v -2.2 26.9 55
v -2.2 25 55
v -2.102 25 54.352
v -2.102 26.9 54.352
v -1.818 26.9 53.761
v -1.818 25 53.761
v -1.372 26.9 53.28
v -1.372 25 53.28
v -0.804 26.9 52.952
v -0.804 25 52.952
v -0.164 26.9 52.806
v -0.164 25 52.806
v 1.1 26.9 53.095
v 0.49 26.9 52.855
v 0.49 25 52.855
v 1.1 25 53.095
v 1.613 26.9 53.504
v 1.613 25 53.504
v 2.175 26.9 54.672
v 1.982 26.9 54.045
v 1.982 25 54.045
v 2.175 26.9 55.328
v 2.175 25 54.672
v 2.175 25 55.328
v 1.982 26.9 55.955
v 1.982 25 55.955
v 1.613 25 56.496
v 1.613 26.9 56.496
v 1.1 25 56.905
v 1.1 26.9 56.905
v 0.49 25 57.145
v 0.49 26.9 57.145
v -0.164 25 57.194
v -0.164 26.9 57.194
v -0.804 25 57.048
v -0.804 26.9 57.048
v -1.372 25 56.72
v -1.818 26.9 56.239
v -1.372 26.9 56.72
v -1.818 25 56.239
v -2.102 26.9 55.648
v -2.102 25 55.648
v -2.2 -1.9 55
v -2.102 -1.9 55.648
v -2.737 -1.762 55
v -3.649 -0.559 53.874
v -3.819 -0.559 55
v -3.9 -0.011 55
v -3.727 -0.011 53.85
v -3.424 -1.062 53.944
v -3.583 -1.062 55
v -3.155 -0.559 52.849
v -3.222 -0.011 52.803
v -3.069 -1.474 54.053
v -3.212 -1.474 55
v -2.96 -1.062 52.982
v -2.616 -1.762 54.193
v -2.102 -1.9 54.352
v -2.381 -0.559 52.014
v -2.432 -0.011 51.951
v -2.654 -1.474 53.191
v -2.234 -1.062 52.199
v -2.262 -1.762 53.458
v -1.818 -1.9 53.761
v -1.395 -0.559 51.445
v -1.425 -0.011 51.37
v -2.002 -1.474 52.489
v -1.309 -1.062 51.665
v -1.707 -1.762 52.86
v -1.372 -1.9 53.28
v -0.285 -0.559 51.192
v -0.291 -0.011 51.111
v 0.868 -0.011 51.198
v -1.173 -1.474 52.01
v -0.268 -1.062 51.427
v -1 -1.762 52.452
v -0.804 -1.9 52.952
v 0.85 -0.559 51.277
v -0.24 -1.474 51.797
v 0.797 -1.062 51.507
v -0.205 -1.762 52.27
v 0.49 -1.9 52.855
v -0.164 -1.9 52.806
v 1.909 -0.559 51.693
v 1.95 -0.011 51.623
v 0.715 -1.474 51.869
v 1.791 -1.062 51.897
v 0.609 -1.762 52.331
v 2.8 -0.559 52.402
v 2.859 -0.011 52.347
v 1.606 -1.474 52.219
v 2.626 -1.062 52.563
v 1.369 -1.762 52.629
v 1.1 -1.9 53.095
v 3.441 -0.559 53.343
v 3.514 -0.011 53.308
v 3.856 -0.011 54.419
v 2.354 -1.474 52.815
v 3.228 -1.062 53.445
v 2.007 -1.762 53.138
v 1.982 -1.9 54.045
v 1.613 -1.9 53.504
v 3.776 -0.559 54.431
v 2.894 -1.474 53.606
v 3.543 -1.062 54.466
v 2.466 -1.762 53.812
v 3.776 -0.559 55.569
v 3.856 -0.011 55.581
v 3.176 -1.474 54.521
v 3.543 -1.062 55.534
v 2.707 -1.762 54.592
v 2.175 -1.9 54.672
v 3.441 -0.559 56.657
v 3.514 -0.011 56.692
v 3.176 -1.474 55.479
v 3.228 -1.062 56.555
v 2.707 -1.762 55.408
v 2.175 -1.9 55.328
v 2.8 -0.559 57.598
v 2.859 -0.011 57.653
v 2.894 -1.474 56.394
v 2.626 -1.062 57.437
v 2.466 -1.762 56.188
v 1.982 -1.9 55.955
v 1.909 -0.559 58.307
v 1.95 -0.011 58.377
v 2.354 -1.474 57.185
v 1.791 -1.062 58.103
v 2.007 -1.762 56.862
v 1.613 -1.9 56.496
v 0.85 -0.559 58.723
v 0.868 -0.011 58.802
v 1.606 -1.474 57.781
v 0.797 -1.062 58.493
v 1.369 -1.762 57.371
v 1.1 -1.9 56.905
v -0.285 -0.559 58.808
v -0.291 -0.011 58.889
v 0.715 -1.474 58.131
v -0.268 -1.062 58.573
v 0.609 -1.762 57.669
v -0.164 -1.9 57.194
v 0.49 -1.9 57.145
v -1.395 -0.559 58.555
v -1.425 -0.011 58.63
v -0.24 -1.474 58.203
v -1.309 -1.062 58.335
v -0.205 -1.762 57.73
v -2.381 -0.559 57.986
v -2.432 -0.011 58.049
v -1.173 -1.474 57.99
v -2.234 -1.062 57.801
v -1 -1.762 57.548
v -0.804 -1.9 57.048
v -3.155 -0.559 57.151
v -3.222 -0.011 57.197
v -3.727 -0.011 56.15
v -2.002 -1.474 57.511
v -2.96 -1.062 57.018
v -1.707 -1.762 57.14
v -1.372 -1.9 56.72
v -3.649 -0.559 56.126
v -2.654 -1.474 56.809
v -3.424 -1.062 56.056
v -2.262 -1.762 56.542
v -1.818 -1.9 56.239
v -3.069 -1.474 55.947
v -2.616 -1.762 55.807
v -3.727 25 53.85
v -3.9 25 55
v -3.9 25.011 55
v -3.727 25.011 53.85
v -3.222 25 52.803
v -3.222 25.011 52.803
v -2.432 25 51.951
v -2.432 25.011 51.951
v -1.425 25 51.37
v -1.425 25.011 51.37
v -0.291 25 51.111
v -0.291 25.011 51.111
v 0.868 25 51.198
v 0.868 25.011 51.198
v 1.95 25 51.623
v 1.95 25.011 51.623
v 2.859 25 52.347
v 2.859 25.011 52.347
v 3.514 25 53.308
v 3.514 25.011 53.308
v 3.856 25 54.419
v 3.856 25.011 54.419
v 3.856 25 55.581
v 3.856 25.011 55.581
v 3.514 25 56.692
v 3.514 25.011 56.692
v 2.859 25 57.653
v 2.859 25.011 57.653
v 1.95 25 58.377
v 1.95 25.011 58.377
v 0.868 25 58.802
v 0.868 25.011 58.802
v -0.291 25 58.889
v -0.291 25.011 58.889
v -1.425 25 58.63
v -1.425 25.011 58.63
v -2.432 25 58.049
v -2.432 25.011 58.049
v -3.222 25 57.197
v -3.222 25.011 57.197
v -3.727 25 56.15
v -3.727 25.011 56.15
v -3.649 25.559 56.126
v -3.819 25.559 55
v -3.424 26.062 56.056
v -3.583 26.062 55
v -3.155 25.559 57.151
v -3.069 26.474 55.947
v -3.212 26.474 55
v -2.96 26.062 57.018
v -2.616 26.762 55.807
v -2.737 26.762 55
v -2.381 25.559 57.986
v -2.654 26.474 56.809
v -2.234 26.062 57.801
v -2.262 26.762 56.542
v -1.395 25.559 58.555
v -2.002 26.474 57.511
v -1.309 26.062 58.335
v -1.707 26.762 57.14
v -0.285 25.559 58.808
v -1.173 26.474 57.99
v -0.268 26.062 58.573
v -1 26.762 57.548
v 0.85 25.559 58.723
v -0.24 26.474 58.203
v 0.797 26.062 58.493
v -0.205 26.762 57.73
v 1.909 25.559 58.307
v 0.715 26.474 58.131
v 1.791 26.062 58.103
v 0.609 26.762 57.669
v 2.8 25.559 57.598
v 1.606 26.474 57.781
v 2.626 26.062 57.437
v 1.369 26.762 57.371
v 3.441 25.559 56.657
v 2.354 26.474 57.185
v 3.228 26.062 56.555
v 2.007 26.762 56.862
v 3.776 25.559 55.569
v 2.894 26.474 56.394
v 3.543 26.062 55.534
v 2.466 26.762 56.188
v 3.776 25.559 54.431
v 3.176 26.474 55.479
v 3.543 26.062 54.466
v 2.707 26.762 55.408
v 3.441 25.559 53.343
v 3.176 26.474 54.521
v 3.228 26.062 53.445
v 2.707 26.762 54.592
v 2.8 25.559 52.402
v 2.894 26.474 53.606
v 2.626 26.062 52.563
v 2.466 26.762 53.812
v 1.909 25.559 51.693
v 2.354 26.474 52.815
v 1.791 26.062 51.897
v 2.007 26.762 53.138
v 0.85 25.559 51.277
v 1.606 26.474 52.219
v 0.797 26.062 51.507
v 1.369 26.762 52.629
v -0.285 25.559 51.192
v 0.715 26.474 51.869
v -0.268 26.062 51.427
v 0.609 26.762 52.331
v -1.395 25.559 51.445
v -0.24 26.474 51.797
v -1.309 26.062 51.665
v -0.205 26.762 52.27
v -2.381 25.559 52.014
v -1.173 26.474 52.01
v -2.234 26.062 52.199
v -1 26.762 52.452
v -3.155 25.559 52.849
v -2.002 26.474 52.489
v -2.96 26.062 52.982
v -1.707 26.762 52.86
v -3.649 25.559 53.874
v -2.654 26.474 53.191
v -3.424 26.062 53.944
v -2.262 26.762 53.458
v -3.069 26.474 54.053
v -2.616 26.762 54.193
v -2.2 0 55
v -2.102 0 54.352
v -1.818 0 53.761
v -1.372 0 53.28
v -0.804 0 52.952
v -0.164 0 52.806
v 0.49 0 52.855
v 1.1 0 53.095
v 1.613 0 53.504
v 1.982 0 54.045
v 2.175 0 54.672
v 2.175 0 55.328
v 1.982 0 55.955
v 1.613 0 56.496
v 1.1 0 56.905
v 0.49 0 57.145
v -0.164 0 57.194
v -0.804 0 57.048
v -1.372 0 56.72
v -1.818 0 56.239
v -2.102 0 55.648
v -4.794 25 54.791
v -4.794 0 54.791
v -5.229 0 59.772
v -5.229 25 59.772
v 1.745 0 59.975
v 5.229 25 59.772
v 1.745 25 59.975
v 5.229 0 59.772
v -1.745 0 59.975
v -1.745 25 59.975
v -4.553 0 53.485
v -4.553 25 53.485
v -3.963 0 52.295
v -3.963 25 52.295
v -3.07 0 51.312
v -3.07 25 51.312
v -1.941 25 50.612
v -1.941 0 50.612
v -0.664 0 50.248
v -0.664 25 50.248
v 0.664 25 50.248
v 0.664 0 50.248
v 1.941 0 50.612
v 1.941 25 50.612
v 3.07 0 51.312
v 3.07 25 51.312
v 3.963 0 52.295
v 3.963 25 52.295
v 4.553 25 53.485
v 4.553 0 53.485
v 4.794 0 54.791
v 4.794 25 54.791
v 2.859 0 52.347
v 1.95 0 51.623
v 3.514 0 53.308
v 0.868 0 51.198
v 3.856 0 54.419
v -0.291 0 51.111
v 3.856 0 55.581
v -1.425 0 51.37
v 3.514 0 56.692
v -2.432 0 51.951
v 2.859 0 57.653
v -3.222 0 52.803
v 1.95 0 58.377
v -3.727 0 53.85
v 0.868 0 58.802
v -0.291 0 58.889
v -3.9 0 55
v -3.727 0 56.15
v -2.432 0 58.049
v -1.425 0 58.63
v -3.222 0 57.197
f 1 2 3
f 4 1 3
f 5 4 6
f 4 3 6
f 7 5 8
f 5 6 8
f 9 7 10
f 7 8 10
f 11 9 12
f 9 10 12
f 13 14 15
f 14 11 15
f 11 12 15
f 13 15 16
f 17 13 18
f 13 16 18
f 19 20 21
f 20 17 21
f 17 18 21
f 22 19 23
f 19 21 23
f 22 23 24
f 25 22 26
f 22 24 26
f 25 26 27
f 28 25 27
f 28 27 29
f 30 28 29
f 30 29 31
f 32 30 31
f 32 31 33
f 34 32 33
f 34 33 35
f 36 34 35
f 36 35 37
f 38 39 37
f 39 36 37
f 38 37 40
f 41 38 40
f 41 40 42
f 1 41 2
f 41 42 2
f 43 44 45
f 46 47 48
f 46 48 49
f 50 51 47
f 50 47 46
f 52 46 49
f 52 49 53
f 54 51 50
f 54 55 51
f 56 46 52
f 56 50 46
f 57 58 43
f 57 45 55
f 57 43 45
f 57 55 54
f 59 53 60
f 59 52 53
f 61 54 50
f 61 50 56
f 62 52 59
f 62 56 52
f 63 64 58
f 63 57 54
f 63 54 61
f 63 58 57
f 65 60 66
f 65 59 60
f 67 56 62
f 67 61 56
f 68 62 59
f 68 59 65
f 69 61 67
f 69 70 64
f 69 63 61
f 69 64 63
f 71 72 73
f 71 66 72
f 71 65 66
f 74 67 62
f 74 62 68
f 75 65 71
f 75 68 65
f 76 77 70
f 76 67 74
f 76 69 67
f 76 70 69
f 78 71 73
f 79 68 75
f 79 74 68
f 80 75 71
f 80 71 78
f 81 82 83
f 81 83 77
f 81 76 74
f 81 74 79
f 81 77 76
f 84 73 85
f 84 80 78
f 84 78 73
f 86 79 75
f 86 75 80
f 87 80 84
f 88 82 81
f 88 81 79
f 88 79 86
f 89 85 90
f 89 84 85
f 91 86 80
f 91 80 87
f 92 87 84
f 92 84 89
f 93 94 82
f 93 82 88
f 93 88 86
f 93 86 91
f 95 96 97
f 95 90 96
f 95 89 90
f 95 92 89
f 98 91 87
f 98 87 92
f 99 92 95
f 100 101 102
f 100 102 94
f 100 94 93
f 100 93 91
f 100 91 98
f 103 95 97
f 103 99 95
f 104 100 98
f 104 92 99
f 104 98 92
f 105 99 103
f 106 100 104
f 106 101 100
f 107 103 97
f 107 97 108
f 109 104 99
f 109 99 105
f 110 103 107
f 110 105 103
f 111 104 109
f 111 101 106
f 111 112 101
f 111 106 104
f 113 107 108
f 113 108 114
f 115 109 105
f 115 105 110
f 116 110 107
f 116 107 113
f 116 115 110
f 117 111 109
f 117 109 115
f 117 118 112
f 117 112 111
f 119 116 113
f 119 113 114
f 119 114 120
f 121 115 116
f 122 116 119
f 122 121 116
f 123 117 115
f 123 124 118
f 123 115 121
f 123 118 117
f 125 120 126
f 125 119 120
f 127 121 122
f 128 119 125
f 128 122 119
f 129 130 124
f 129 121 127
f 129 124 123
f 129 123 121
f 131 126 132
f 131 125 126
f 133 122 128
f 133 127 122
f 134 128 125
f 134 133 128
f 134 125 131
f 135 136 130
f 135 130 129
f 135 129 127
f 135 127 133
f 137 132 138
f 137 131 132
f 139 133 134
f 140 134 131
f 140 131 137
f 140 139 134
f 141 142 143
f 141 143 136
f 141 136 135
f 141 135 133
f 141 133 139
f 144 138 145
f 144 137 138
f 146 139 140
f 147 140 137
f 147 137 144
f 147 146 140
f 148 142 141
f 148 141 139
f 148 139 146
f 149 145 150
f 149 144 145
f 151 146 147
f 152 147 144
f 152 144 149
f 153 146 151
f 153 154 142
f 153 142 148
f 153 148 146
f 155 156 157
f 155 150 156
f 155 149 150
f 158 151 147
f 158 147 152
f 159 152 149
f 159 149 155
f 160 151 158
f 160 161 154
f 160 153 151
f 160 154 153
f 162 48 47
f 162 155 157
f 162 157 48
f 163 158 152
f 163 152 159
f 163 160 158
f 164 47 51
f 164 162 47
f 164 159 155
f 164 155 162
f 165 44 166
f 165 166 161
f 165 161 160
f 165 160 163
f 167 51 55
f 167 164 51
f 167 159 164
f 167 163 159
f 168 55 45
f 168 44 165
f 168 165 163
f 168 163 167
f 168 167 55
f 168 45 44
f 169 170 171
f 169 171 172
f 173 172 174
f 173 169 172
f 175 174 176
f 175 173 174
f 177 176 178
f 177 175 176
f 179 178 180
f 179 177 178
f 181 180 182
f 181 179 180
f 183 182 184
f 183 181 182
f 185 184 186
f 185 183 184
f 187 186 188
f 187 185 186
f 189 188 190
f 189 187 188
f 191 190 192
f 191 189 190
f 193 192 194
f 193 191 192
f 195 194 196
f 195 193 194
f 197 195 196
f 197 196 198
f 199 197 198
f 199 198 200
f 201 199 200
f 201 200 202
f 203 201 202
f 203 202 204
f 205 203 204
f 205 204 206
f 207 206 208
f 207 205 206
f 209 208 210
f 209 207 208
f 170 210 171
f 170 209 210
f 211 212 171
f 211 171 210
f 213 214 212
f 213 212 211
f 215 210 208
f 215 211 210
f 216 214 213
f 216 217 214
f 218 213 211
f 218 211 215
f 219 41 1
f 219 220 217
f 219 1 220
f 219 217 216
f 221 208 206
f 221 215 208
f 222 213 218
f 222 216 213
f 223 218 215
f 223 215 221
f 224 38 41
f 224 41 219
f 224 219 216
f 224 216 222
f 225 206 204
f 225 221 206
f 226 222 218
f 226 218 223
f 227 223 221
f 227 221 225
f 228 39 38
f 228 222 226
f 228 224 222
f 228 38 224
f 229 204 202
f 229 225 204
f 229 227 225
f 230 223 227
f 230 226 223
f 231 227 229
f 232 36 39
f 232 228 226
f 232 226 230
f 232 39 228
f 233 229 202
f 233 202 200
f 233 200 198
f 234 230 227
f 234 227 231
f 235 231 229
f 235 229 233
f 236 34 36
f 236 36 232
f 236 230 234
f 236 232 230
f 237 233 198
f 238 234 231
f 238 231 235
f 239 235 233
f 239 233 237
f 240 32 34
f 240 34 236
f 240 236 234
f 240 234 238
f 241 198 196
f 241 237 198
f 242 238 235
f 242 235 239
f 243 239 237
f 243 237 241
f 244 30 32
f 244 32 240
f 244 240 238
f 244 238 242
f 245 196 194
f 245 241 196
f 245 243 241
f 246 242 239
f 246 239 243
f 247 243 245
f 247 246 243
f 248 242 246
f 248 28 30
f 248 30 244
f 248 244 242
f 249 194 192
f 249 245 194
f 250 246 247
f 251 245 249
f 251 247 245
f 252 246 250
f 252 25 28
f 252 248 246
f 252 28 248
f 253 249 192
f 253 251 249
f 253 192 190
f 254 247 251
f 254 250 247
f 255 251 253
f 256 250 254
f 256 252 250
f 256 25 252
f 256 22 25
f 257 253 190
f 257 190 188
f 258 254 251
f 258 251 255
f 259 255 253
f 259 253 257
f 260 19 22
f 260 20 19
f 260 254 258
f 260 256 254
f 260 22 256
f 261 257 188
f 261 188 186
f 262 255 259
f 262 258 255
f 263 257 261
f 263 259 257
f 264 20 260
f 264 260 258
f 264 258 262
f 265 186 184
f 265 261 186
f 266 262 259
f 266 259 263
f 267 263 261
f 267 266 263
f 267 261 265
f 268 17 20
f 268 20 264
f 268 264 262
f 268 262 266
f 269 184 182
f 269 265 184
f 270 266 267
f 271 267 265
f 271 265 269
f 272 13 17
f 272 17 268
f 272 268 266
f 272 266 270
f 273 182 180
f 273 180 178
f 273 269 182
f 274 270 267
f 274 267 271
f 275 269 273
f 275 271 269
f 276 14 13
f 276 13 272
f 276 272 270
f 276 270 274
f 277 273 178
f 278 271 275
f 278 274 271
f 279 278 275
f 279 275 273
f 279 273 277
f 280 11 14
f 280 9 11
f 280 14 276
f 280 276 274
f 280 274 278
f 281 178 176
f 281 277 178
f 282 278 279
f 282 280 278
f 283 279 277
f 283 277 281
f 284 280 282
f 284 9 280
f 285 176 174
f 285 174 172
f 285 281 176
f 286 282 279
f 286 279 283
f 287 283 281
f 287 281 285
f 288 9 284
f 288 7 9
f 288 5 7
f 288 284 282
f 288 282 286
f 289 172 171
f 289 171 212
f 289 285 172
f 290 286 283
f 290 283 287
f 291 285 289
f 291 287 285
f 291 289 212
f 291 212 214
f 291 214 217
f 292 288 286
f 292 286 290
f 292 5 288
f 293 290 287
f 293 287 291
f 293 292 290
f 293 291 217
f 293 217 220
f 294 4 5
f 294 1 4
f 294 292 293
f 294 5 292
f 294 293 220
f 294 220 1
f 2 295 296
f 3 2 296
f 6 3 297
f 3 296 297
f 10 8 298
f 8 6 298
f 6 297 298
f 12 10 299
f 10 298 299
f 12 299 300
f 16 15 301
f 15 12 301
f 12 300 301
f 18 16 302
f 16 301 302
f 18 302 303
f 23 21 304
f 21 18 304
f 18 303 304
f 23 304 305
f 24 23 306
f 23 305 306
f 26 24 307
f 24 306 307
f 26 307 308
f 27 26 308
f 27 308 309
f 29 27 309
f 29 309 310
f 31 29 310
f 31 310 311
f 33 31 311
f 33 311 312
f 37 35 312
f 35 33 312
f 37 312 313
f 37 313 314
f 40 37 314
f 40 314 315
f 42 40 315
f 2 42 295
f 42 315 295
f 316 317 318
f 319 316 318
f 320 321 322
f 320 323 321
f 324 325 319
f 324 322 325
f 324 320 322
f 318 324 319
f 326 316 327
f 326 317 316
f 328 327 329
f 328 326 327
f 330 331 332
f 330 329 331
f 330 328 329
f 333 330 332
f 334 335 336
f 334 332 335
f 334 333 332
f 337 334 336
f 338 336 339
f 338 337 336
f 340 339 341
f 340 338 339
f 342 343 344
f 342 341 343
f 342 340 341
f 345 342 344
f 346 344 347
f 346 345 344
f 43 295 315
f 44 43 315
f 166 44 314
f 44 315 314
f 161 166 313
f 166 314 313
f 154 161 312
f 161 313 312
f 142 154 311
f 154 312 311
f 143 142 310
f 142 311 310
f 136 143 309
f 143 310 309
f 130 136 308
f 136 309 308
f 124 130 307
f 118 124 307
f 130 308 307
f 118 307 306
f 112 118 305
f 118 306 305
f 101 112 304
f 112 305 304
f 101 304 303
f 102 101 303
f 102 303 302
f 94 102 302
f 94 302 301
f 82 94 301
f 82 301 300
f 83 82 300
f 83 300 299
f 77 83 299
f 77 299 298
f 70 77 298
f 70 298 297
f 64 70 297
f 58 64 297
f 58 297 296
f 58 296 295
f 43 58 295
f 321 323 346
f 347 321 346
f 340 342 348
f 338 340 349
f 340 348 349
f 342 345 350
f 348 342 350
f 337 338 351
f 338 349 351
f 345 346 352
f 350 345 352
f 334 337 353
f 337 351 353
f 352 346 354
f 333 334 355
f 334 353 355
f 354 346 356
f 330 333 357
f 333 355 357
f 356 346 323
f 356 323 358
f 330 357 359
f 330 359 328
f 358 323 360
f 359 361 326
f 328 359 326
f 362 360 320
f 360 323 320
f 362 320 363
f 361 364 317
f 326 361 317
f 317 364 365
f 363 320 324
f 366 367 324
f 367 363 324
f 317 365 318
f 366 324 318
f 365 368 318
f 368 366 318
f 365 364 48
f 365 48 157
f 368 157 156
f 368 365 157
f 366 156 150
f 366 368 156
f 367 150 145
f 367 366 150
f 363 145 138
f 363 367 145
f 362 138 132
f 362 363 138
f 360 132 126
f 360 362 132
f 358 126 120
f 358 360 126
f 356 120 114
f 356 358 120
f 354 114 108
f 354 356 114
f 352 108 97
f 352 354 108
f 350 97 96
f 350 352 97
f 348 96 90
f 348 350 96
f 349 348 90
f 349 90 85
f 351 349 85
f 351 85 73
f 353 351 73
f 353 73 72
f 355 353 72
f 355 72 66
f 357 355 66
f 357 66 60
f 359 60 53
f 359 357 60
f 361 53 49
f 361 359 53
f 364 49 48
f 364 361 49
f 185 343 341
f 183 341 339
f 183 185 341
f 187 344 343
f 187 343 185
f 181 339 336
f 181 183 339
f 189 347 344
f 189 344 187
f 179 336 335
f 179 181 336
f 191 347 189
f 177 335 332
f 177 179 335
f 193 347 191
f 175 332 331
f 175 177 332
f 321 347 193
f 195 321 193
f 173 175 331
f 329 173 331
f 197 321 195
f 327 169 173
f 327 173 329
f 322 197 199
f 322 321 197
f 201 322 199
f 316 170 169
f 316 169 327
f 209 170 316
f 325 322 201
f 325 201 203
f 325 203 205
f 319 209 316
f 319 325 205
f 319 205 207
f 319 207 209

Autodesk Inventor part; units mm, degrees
ref_plane "YZ Plane" through (0, 0, 0) normal (1, 0, 0) x (0, 1, 0)
ref_plane "XZ Plane" through (0, 0, 0) normal (0, 1, 0) x (-1, 0, 0)
ref_plane "XY Plane" through (0, 0, 0) normal (0, 0, 1) x (1, 0, 0)
sketch "Sketch1" plane through (0, 0, 0) normal (0, 1, 0) x (-1, 0, 0)
  circle A0 centre (0, 0) radius 60 construction
  circle A1 centre (0, 0) radius 55 construction
  circle A2 centre (0, 55) radius 2.2
  arc A3 (5.2293, 59.7717) -> (-5.2293, 59.7717) centre (0, 0) ccw
  line L0 (0, 0) -> (5.2293, 59.7717) construction
  line L1 (0, 0) -> (60, 0) construction
  line L2 (0, 0) -> (-5.2293, 59.7717) construction
  line L3 (0, 24.4692) -> (0, -19) construction
  arc A4 (-4.7936, 54.7907) -> (4.7936, 54.7907) centre (0, 55) ccw
  line L4 (4.7936, 54.7907) -> (5.2293, 59.7717)
  line L5 (-5.2293, 59.7717) -> (-4.7936, 54.7907)
  circle A5 centre (0, 55) radius 3.9
  dimension "d0" = 120
  dimension "d1" = 110
  dimension "d2" = 4.4
  dimension "d4" = 10
  dimension "d5" = 5
  dimension "d8" = 7.8
extrude "Extrusion1" add sketch "Sketch1" along normal blind 25 contours L4 A4 L5 A3 | A5
extrude "Extrusion2" add sketch "Sketch1" along normal blind 26.9 and the other way blind 1.9 contours A5
fillet "Fillet1" radius 1.9 2 edges at (3.9, 26.9, 55) (3.9, -1.9, 55)
equation "\"d5\" = 0.5 * d4"
properties part number "Spacer"
